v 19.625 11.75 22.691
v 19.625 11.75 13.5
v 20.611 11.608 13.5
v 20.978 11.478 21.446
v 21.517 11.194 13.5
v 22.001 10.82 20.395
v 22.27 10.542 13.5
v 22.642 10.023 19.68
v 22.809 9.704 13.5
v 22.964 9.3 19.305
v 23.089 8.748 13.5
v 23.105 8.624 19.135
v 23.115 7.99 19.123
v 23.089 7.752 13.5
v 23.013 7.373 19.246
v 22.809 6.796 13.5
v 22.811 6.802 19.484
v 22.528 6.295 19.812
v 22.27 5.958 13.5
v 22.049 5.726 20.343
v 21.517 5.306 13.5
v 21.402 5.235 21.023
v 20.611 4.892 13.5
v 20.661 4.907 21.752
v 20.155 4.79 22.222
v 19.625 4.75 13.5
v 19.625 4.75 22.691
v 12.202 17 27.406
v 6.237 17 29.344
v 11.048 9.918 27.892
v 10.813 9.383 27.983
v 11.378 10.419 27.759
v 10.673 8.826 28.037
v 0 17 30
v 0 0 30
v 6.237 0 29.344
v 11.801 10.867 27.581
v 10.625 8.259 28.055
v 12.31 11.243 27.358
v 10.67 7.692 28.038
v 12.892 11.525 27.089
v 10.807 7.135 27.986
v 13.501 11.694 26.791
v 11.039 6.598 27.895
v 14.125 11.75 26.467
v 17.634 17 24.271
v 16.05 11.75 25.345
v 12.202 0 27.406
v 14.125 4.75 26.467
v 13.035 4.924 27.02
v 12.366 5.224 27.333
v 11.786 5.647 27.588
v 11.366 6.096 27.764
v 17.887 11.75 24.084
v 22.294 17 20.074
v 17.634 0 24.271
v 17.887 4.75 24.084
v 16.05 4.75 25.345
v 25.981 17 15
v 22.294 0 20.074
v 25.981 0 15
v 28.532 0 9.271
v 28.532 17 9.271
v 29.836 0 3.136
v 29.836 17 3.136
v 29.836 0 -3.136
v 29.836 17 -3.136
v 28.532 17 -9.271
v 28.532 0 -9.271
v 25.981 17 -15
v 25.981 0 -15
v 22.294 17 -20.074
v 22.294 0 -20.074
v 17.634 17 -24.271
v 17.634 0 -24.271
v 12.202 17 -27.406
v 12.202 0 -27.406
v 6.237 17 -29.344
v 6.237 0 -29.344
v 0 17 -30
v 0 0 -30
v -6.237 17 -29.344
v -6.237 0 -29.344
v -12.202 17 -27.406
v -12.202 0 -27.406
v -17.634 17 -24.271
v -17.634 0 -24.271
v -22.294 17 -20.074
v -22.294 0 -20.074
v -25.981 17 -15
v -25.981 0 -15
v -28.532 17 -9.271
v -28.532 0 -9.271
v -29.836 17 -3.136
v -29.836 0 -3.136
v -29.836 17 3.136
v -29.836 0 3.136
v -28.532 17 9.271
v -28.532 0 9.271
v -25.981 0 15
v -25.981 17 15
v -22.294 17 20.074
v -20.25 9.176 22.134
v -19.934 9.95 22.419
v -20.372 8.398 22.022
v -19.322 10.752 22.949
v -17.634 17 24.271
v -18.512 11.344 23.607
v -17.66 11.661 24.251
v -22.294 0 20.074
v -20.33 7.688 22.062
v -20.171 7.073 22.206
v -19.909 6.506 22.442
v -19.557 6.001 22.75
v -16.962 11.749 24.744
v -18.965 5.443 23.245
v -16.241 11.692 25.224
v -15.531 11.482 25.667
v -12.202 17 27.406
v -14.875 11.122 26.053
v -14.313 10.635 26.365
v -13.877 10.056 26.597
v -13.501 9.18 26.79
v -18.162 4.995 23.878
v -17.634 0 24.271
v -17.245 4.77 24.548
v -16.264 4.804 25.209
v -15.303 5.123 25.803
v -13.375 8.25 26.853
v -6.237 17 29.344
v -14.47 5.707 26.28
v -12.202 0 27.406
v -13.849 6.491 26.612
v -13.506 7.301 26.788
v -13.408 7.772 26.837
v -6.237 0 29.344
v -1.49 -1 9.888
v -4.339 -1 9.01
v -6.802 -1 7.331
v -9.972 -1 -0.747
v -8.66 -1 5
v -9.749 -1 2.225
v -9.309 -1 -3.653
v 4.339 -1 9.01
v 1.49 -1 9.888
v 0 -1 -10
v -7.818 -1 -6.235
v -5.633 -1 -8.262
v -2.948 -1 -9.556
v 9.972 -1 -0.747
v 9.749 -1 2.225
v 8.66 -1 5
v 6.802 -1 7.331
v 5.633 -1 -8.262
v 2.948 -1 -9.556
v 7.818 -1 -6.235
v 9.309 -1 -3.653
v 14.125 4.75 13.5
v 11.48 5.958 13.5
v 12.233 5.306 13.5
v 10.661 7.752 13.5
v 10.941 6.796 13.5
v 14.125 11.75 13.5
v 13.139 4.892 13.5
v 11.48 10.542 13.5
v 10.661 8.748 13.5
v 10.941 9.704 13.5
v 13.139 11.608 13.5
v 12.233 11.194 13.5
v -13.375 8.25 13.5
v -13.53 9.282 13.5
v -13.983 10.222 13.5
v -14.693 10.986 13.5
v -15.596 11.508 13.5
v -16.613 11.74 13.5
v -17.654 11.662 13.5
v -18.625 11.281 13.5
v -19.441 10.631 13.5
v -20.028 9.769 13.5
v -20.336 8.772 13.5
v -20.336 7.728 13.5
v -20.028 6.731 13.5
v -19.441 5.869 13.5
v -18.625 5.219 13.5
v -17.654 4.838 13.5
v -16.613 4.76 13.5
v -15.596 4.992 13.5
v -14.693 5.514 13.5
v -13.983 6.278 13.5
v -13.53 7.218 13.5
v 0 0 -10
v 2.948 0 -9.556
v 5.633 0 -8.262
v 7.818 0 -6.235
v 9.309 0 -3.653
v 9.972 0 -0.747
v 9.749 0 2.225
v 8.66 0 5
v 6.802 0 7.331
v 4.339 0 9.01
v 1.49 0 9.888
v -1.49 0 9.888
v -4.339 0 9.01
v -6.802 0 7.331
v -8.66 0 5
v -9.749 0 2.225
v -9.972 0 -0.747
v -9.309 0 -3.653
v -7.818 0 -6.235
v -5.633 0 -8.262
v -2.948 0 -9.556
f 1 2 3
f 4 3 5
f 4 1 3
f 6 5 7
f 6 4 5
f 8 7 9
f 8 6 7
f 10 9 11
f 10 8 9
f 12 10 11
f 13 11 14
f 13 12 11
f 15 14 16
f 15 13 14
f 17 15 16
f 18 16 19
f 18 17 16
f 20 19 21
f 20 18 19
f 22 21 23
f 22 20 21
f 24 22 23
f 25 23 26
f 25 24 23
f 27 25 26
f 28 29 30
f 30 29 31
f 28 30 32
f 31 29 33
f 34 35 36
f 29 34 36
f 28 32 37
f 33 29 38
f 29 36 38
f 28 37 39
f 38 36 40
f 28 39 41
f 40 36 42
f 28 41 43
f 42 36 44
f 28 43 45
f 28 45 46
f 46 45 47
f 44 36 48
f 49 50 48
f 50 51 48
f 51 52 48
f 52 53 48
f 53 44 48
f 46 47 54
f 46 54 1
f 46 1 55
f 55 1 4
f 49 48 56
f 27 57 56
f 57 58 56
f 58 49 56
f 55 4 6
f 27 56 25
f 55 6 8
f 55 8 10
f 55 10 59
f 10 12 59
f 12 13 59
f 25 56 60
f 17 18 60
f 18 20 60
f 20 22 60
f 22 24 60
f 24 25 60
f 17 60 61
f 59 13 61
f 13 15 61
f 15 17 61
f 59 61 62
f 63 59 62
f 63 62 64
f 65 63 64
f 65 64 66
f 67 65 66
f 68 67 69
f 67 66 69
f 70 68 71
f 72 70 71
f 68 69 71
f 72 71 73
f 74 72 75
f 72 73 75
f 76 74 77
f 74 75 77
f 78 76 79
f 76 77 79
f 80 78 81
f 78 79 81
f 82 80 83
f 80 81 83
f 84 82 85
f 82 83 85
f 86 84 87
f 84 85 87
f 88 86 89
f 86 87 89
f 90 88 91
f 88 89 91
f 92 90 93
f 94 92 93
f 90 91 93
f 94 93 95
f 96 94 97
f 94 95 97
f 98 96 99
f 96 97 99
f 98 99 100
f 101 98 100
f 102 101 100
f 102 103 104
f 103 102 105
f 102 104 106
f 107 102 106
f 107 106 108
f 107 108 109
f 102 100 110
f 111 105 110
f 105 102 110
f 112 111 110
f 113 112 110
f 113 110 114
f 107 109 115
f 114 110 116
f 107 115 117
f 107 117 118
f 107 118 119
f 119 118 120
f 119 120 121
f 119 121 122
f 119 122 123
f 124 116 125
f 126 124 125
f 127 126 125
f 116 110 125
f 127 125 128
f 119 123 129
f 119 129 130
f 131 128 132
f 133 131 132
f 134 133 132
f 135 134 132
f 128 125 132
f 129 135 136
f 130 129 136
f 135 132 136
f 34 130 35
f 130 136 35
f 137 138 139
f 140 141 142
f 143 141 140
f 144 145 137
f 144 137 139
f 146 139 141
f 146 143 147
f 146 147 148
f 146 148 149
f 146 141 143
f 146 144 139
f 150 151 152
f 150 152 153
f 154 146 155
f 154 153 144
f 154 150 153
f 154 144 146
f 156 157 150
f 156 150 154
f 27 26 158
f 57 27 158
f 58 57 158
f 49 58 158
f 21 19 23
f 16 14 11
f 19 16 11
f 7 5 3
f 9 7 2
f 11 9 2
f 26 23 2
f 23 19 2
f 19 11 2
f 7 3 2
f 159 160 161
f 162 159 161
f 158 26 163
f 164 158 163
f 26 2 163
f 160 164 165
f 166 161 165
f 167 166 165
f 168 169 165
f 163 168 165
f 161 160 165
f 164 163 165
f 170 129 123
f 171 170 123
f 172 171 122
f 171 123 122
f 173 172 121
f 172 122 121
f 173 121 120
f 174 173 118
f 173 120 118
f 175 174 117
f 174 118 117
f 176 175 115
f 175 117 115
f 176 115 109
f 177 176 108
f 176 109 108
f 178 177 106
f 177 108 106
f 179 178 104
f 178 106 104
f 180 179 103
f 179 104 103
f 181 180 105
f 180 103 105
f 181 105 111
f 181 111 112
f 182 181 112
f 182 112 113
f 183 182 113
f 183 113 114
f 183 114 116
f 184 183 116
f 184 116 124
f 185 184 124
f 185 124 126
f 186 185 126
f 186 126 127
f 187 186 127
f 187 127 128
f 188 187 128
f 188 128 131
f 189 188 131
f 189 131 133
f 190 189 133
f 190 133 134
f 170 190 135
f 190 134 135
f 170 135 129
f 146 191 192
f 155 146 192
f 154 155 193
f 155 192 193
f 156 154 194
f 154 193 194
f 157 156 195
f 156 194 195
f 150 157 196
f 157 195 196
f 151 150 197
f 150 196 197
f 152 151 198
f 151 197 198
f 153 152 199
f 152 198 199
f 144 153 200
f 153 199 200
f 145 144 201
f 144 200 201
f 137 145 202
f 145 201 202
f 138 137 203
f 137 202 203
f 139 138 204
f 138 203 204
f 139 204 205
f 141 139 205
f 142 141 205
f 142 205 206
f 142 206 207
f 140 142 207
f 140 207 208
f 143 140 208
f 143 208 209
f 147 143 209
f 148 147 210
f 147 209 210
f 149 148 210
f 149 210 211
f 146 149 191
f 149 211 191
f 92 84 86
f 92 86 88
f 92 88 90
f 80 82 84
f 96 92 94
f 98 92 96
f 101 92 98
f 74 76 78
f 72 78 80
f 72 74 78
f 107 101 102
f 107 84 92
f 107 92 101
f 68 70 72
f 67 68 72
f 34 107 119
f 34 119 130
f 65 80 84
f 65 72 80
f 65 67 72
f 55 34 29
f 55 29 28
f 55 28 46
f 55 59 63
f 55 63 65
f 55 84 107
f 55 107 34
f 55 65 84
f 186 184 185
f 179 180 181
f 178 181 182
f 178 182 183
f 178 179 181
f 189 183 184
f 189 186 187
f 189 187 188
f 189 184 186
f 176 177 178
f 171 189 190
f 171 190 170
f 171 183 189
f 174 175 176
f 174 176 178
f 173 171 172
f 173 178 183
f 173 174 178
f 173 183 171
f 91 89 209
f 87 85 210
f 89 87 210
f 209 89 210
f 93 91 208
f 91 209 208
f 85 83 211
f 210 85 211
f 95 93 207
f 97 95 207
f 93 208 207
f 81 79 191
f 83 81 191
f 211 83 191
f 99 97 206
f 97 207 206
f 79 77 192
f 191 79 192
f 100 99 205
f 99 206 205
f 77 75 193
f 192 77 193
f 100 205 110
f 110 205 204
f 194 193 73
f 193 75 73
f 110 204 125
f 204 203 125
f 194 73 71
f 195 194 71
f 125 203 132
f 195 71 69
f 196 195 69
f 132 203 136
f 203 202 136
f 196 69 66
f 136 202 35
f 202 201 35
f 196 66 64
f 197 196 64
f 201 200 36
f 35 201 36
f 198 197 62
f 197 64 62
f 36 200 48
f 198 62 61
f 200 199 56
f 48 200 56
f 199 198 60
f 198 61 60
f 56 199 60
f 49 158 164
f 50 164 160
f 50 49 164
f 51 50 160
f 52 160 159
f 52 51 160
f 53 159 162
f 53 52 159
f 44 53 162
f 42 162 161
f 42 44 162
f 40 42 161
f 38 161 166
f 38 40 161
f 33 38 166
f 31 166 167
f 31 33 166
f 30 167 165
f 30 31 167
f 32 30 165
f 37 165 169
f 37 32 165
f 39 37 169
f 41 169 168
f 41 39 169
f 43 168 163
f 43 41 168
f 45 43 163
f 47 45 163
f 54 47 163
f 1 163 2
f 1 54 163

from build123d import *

# Parameters (mm, degrees)
SKETCH1_R           = 30
BOSS_EXTRUDE1_DEPTH = 17
SKETCH2_R           = 3.5
CUT_EXTRUDE1_DEPTH  = 16.5
SKETCH3_R           = 10
BOSS_EXTRUDE2_DEPTH = 1


with BuildPart() as part:
    # Sketch1 → Boss-Extrude1 (new body)
    with BuildSketch(Plane(origin=(0, 0, 0), x_dir=(1, 0, 0), z_dir=(0, 1, 0))):
        with Locations(Location((0, 0, 0), (0, 0, 270))):
            Circle(SKETCH1_R)
    extrude(amount=BOSS_EXTRUDE1_DEPTH)

    # Sketch2 → Cut-Extrude1 (cut)
    with BuildSketch(Plane.XY.offset(30)):
        with Locations((-16.875, 8.25)):
            Circle(SKETCH2_R)
        with BuildLine():
            Line((14.125, 11.75), (19.625, 11.75))
            ThreePointArc((19.625, 11.75), (23.125, 8.25), (19.625, 4.75))
            Line((19.625, 4.75), (14.125, 4.75))
            ThreePointArc((14.125, 4.75), (10.625, 8.25), (14.125, 11.75))
        make_face()
    extrude(amount=-CUT_EXTRUDE1_DEPTH, mode=Mode.SUBTRACT)

    # Sketch3 → Boss-Extrude2 (add)
    with BuildSketch(Plane.XZ):
        with Locations(Location((0, 0, 0), (0, 0, 270))):
            Circle(SKETCH3_R)
    extrude(amount=BOSS_EXTRUDE2_DEPTH)


solid = part.part
